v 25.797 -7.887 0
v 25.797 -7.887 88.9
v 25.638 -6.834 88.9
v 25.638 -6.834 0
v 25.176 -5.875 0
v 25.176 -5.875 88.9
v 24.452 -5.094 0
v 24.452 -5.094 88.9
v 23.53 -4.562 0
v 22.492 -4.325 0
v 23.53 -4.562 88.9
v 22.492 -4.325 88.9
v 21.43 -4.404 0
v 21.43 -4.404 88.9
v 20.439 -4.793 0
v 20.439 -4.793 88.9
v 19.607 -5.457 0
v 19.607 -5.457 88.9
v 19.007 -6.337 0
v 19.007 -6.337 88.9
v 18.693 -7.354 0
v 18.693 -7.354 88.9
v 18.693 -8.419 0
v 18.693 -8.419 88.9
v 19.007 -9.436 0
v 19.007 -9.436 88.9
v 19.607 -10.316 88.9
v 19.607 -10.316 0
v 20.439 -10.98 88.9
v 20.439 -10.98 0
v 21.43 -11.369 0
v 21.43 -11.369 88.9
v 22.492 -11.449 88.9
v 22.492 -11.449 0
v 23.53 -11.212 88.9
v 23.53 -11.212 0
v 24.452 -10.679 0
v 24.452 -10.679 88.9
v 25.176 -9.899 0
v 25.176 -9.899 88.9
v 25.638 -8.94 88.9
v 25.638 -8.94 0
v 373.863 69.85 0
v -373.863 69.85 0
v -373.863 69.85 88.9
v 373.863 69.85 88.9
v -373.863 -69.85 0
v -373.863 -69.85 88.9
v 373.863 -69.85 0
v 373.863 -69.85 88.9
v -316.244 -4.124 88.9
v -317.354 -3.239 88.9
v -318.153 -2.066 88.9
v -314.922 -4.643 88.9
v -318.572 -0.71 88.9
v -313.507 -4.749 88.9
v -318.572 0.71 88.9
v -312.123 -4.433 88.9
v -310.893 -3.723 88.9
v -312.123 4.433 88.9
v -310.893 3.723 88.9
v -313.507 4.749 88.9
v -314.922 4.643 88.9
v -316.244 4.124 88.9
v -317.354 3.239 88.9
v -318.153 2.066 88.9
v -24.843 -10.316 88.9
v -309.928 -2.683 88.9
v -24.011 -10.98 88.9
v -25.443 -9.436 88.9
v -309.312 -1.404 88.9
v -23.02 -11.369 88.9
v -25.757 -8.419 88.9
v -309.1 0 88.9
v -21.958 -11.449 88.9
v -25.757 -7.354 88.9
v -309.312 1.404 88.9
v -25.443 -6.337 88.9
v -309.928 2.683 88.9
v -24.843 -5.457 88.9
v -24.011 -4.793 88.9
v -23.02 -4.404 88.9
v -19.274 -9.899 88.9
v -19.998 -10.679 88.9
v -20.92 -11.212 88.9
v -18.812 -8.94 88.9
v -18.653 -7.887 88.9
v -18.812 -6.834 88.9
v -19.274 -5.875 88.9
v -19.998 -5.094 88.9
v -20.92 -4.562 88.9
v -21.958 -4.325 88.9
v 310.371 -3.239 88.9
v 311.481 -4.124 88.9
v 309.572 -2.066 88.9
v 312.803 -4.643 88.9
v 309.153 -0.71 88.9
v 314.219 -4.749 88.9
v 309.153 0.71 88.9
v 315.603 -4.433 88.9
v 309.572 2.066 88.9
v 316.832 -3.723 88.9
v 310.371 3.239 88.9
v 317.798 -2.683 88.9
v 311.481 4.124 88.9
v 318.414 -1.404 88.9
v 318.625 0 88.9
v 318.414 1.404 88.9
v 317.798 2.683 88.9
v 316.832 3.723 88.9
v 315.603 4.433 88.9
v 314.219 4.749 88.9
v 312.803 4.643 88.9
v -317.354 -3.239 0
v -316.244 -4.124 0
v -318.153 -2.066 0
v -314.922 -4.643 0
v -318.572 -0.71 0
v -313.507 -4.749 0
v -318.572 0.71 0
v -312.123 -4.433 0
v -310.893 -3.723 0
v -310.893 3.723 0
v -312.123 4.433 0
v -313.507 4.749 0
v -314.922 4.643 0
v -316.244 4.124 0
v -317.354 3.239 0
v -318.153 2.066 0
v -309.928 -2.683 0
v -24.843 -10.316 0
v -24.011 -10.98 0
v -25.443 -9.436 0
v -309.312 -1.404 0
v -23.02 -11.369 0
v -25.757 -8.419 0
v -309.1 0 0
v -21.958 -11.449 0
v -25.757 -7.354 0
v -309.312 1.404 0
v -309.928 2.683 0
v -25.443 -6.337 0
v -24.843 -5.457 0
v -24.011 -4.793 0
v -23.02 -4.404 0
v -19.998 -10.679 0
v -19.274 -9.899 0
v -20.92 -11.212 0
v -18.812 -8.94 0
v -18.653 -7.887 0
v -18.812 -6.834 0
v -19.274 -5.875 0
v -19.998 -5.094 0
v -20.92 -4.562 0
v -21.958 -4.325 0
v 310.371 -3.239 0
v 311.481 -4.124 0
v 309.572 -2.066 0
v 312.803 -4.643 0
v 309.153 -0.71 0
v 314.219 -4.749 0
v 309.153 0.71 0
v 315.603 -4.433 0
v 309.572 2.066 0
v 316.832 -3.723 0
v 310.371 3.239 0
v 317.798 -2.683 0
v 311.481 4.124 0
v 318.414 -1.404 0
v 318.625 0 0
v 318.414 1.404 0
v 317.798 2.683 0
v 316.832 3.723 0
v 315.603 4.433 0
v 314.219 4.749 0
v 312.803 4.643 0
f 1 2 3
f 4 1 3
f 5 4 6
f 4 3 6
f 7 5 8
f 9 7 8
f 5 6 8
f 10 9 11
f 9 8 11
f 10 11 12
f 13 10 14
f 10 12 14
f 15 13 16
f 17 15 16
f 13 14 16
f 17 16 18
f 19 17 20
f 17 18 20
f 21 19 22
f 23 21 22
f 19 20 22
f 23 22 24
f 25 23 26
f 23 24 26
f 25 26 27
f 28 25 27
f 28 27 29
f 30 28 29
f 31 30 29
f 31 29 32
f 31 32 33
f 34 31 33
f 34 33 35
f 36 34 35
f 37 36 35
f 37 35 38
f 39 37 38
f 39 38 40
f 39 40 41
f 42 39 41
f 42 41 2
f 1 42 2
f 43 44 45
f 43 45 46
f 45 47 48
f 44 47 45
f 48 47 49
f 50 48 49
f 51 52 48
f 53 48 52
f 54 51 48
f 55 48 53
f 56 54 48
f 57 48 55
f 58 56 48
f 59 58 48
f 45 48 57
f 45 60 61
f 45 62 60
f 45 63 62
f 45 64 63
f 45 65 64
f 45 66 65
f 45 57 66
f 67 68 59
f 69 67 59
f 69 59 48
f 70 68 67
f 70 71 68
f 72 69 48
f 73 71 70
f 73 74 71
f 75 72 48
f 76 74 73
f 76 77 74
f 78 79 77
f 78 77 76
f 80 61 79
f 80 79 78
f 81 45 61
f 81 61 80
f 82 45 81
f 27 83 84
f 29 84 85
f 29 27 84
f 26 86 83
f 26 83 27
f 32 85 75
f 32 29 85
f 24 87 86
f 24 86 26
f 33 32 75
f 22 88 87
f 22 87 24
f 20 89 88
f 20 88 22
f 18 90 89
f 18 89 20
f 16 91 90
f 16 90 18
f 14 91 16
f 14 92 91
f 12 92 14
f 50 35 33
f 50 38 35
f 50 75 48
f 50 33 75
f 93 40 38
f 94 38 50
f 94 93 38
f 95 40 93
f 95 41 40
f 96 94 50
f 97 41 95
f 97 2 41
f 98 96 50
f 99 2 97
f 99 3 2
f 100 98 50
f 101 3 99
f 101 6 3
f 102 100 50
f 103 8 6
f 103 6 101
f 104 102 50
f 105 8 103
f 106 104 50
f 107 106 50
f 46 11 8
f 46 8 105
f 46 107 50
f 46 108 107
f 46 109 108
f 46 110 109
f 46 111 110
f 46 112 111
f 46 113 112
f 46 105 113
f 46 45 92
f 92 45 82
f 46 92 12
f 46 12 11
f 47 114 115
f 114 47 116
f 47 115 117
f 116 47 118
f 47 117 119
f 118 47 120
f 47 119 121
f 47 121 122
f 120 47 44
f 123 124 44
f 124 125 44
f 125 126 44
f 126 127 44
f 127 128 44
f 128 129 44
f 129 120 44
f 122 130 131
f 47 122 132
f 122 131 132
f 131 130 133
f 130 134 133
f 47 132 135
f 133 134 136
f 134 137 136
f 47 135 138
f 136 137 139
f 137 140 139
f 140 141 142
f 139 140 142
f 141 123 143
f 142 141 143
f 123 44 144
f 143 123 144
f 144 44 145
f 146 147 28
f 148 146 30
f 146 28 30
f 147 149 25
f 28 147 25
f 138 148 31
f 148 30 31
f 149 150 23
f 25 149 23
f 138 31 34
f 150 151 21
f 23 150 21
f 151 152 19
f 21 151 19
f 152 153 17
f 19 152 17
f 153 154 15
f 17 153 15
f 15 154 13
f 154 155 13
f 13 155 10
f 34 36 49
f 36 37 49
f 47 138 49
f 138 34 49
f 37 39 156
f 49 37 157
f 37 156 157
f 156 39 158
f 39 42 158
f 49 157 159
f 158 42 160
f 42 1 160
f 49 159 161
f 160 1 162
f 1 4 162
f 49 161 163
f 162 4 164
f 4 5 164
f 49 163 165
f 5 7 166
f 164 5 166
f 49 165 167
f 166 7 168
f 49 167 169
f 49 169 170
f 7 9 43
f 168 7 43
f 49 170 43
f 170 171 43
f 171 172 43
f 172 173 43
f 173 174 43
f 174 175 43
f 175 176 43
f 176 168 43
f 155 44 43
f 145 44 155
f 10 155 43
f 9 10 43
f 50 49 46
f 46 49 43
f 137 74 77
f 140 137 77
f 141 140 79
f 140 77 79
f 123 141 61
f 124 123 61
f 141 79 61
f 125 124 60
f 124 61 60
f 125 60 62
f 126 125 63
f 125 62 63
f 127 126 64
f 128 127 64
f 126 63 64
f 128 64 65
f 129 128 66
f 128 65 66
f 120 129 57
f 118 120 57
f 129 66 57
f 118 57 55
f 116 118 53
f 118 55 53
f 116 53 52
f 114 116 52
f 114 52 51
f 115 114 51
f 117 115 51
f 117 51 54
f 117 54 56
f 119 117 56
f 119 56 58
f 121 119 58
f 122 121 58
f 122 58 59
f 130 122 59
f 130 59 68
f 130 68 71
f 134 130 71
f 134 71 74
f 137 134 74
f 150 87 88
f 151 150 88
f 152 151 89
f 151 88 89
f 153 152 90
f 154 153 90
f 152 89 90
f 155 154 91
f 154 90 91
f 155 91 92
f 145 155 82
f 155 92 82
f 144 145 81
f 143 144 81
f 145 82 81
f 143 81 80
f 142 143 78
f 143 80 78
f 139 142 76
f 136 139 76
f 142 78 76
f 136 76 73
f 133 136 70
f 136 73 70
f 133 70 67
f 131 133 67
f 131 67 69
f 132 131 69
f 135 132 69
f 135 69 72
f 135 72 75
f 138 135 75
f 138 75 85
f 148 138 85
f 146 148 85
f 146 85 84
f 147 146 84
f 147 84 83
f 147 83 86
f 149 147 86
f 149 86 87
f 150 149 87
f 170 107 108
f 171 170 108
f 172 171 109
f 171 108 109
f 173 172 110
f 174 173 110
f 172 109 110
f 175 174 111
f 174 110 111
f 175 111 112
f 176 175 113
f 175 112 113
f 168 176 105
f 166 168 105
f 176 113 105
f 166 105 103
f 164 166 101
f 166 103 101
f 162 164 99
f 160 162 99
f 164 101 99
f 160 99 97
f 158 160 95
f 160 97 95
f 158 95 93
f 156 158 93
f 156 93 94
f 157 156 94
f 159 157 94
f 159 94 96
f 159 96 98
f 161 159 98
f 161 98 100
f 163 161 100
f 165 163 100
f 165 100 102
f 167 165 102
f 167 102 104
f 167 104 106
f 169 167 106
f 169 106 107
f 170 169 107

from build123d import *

# Parameters (mm, degrees)
SKETCH1_W           = 747.7252
SKETCH1_H           = 139.7
BOSS_EXTRUDE1_DEPTH = 88.9
SKETCH2_R           = 4.7625
CUT_EXTRUDE1_DEPTH  = 391.583507305
SKETCH3_R           = 3.571875
CUT_EXTRUDE2_DEPTH  = 391.583507305


with BuildPart() as part:
    # Sketch1 → Boss-Extrude1 (new body)
    with BuildSketch(Plane.XY):
        Rectangle(SKETCH1_W, SKETCH1_H)
    extrude(amount=BOSS_EXTRUDE1_DEPTH)

    # Sketch2 → Cut-Extrude1 (cut, through all)
    with BuildSketch(Plane.XY.offset(88.9)):
        with Locations((-313.8626, 0)):
            Circle(SKETCH2_R)
        with Locations((313.8626, 0)):
            Circle(SKETCH2_R)
    extrude(amount=-CUT_EXTRUDE1_DEPTH, mode=Mode.SUBTRACT)

    # Sketch3 → Cut-Extrude2 (cut, through all)
    with BuildSketch(Plane.XY.offset(88.9)):
        with Locations((-22.225, -7.8867)):
            Circle(SKETCH3_R)
        with Locations((22.225, -7.8867)):
            Circle(SKETCH3_R)
    extrude(amount=-CUT_EXTRUDE2_DEPTH, mode=Mode.SUBTRACT)


solid = part.part
